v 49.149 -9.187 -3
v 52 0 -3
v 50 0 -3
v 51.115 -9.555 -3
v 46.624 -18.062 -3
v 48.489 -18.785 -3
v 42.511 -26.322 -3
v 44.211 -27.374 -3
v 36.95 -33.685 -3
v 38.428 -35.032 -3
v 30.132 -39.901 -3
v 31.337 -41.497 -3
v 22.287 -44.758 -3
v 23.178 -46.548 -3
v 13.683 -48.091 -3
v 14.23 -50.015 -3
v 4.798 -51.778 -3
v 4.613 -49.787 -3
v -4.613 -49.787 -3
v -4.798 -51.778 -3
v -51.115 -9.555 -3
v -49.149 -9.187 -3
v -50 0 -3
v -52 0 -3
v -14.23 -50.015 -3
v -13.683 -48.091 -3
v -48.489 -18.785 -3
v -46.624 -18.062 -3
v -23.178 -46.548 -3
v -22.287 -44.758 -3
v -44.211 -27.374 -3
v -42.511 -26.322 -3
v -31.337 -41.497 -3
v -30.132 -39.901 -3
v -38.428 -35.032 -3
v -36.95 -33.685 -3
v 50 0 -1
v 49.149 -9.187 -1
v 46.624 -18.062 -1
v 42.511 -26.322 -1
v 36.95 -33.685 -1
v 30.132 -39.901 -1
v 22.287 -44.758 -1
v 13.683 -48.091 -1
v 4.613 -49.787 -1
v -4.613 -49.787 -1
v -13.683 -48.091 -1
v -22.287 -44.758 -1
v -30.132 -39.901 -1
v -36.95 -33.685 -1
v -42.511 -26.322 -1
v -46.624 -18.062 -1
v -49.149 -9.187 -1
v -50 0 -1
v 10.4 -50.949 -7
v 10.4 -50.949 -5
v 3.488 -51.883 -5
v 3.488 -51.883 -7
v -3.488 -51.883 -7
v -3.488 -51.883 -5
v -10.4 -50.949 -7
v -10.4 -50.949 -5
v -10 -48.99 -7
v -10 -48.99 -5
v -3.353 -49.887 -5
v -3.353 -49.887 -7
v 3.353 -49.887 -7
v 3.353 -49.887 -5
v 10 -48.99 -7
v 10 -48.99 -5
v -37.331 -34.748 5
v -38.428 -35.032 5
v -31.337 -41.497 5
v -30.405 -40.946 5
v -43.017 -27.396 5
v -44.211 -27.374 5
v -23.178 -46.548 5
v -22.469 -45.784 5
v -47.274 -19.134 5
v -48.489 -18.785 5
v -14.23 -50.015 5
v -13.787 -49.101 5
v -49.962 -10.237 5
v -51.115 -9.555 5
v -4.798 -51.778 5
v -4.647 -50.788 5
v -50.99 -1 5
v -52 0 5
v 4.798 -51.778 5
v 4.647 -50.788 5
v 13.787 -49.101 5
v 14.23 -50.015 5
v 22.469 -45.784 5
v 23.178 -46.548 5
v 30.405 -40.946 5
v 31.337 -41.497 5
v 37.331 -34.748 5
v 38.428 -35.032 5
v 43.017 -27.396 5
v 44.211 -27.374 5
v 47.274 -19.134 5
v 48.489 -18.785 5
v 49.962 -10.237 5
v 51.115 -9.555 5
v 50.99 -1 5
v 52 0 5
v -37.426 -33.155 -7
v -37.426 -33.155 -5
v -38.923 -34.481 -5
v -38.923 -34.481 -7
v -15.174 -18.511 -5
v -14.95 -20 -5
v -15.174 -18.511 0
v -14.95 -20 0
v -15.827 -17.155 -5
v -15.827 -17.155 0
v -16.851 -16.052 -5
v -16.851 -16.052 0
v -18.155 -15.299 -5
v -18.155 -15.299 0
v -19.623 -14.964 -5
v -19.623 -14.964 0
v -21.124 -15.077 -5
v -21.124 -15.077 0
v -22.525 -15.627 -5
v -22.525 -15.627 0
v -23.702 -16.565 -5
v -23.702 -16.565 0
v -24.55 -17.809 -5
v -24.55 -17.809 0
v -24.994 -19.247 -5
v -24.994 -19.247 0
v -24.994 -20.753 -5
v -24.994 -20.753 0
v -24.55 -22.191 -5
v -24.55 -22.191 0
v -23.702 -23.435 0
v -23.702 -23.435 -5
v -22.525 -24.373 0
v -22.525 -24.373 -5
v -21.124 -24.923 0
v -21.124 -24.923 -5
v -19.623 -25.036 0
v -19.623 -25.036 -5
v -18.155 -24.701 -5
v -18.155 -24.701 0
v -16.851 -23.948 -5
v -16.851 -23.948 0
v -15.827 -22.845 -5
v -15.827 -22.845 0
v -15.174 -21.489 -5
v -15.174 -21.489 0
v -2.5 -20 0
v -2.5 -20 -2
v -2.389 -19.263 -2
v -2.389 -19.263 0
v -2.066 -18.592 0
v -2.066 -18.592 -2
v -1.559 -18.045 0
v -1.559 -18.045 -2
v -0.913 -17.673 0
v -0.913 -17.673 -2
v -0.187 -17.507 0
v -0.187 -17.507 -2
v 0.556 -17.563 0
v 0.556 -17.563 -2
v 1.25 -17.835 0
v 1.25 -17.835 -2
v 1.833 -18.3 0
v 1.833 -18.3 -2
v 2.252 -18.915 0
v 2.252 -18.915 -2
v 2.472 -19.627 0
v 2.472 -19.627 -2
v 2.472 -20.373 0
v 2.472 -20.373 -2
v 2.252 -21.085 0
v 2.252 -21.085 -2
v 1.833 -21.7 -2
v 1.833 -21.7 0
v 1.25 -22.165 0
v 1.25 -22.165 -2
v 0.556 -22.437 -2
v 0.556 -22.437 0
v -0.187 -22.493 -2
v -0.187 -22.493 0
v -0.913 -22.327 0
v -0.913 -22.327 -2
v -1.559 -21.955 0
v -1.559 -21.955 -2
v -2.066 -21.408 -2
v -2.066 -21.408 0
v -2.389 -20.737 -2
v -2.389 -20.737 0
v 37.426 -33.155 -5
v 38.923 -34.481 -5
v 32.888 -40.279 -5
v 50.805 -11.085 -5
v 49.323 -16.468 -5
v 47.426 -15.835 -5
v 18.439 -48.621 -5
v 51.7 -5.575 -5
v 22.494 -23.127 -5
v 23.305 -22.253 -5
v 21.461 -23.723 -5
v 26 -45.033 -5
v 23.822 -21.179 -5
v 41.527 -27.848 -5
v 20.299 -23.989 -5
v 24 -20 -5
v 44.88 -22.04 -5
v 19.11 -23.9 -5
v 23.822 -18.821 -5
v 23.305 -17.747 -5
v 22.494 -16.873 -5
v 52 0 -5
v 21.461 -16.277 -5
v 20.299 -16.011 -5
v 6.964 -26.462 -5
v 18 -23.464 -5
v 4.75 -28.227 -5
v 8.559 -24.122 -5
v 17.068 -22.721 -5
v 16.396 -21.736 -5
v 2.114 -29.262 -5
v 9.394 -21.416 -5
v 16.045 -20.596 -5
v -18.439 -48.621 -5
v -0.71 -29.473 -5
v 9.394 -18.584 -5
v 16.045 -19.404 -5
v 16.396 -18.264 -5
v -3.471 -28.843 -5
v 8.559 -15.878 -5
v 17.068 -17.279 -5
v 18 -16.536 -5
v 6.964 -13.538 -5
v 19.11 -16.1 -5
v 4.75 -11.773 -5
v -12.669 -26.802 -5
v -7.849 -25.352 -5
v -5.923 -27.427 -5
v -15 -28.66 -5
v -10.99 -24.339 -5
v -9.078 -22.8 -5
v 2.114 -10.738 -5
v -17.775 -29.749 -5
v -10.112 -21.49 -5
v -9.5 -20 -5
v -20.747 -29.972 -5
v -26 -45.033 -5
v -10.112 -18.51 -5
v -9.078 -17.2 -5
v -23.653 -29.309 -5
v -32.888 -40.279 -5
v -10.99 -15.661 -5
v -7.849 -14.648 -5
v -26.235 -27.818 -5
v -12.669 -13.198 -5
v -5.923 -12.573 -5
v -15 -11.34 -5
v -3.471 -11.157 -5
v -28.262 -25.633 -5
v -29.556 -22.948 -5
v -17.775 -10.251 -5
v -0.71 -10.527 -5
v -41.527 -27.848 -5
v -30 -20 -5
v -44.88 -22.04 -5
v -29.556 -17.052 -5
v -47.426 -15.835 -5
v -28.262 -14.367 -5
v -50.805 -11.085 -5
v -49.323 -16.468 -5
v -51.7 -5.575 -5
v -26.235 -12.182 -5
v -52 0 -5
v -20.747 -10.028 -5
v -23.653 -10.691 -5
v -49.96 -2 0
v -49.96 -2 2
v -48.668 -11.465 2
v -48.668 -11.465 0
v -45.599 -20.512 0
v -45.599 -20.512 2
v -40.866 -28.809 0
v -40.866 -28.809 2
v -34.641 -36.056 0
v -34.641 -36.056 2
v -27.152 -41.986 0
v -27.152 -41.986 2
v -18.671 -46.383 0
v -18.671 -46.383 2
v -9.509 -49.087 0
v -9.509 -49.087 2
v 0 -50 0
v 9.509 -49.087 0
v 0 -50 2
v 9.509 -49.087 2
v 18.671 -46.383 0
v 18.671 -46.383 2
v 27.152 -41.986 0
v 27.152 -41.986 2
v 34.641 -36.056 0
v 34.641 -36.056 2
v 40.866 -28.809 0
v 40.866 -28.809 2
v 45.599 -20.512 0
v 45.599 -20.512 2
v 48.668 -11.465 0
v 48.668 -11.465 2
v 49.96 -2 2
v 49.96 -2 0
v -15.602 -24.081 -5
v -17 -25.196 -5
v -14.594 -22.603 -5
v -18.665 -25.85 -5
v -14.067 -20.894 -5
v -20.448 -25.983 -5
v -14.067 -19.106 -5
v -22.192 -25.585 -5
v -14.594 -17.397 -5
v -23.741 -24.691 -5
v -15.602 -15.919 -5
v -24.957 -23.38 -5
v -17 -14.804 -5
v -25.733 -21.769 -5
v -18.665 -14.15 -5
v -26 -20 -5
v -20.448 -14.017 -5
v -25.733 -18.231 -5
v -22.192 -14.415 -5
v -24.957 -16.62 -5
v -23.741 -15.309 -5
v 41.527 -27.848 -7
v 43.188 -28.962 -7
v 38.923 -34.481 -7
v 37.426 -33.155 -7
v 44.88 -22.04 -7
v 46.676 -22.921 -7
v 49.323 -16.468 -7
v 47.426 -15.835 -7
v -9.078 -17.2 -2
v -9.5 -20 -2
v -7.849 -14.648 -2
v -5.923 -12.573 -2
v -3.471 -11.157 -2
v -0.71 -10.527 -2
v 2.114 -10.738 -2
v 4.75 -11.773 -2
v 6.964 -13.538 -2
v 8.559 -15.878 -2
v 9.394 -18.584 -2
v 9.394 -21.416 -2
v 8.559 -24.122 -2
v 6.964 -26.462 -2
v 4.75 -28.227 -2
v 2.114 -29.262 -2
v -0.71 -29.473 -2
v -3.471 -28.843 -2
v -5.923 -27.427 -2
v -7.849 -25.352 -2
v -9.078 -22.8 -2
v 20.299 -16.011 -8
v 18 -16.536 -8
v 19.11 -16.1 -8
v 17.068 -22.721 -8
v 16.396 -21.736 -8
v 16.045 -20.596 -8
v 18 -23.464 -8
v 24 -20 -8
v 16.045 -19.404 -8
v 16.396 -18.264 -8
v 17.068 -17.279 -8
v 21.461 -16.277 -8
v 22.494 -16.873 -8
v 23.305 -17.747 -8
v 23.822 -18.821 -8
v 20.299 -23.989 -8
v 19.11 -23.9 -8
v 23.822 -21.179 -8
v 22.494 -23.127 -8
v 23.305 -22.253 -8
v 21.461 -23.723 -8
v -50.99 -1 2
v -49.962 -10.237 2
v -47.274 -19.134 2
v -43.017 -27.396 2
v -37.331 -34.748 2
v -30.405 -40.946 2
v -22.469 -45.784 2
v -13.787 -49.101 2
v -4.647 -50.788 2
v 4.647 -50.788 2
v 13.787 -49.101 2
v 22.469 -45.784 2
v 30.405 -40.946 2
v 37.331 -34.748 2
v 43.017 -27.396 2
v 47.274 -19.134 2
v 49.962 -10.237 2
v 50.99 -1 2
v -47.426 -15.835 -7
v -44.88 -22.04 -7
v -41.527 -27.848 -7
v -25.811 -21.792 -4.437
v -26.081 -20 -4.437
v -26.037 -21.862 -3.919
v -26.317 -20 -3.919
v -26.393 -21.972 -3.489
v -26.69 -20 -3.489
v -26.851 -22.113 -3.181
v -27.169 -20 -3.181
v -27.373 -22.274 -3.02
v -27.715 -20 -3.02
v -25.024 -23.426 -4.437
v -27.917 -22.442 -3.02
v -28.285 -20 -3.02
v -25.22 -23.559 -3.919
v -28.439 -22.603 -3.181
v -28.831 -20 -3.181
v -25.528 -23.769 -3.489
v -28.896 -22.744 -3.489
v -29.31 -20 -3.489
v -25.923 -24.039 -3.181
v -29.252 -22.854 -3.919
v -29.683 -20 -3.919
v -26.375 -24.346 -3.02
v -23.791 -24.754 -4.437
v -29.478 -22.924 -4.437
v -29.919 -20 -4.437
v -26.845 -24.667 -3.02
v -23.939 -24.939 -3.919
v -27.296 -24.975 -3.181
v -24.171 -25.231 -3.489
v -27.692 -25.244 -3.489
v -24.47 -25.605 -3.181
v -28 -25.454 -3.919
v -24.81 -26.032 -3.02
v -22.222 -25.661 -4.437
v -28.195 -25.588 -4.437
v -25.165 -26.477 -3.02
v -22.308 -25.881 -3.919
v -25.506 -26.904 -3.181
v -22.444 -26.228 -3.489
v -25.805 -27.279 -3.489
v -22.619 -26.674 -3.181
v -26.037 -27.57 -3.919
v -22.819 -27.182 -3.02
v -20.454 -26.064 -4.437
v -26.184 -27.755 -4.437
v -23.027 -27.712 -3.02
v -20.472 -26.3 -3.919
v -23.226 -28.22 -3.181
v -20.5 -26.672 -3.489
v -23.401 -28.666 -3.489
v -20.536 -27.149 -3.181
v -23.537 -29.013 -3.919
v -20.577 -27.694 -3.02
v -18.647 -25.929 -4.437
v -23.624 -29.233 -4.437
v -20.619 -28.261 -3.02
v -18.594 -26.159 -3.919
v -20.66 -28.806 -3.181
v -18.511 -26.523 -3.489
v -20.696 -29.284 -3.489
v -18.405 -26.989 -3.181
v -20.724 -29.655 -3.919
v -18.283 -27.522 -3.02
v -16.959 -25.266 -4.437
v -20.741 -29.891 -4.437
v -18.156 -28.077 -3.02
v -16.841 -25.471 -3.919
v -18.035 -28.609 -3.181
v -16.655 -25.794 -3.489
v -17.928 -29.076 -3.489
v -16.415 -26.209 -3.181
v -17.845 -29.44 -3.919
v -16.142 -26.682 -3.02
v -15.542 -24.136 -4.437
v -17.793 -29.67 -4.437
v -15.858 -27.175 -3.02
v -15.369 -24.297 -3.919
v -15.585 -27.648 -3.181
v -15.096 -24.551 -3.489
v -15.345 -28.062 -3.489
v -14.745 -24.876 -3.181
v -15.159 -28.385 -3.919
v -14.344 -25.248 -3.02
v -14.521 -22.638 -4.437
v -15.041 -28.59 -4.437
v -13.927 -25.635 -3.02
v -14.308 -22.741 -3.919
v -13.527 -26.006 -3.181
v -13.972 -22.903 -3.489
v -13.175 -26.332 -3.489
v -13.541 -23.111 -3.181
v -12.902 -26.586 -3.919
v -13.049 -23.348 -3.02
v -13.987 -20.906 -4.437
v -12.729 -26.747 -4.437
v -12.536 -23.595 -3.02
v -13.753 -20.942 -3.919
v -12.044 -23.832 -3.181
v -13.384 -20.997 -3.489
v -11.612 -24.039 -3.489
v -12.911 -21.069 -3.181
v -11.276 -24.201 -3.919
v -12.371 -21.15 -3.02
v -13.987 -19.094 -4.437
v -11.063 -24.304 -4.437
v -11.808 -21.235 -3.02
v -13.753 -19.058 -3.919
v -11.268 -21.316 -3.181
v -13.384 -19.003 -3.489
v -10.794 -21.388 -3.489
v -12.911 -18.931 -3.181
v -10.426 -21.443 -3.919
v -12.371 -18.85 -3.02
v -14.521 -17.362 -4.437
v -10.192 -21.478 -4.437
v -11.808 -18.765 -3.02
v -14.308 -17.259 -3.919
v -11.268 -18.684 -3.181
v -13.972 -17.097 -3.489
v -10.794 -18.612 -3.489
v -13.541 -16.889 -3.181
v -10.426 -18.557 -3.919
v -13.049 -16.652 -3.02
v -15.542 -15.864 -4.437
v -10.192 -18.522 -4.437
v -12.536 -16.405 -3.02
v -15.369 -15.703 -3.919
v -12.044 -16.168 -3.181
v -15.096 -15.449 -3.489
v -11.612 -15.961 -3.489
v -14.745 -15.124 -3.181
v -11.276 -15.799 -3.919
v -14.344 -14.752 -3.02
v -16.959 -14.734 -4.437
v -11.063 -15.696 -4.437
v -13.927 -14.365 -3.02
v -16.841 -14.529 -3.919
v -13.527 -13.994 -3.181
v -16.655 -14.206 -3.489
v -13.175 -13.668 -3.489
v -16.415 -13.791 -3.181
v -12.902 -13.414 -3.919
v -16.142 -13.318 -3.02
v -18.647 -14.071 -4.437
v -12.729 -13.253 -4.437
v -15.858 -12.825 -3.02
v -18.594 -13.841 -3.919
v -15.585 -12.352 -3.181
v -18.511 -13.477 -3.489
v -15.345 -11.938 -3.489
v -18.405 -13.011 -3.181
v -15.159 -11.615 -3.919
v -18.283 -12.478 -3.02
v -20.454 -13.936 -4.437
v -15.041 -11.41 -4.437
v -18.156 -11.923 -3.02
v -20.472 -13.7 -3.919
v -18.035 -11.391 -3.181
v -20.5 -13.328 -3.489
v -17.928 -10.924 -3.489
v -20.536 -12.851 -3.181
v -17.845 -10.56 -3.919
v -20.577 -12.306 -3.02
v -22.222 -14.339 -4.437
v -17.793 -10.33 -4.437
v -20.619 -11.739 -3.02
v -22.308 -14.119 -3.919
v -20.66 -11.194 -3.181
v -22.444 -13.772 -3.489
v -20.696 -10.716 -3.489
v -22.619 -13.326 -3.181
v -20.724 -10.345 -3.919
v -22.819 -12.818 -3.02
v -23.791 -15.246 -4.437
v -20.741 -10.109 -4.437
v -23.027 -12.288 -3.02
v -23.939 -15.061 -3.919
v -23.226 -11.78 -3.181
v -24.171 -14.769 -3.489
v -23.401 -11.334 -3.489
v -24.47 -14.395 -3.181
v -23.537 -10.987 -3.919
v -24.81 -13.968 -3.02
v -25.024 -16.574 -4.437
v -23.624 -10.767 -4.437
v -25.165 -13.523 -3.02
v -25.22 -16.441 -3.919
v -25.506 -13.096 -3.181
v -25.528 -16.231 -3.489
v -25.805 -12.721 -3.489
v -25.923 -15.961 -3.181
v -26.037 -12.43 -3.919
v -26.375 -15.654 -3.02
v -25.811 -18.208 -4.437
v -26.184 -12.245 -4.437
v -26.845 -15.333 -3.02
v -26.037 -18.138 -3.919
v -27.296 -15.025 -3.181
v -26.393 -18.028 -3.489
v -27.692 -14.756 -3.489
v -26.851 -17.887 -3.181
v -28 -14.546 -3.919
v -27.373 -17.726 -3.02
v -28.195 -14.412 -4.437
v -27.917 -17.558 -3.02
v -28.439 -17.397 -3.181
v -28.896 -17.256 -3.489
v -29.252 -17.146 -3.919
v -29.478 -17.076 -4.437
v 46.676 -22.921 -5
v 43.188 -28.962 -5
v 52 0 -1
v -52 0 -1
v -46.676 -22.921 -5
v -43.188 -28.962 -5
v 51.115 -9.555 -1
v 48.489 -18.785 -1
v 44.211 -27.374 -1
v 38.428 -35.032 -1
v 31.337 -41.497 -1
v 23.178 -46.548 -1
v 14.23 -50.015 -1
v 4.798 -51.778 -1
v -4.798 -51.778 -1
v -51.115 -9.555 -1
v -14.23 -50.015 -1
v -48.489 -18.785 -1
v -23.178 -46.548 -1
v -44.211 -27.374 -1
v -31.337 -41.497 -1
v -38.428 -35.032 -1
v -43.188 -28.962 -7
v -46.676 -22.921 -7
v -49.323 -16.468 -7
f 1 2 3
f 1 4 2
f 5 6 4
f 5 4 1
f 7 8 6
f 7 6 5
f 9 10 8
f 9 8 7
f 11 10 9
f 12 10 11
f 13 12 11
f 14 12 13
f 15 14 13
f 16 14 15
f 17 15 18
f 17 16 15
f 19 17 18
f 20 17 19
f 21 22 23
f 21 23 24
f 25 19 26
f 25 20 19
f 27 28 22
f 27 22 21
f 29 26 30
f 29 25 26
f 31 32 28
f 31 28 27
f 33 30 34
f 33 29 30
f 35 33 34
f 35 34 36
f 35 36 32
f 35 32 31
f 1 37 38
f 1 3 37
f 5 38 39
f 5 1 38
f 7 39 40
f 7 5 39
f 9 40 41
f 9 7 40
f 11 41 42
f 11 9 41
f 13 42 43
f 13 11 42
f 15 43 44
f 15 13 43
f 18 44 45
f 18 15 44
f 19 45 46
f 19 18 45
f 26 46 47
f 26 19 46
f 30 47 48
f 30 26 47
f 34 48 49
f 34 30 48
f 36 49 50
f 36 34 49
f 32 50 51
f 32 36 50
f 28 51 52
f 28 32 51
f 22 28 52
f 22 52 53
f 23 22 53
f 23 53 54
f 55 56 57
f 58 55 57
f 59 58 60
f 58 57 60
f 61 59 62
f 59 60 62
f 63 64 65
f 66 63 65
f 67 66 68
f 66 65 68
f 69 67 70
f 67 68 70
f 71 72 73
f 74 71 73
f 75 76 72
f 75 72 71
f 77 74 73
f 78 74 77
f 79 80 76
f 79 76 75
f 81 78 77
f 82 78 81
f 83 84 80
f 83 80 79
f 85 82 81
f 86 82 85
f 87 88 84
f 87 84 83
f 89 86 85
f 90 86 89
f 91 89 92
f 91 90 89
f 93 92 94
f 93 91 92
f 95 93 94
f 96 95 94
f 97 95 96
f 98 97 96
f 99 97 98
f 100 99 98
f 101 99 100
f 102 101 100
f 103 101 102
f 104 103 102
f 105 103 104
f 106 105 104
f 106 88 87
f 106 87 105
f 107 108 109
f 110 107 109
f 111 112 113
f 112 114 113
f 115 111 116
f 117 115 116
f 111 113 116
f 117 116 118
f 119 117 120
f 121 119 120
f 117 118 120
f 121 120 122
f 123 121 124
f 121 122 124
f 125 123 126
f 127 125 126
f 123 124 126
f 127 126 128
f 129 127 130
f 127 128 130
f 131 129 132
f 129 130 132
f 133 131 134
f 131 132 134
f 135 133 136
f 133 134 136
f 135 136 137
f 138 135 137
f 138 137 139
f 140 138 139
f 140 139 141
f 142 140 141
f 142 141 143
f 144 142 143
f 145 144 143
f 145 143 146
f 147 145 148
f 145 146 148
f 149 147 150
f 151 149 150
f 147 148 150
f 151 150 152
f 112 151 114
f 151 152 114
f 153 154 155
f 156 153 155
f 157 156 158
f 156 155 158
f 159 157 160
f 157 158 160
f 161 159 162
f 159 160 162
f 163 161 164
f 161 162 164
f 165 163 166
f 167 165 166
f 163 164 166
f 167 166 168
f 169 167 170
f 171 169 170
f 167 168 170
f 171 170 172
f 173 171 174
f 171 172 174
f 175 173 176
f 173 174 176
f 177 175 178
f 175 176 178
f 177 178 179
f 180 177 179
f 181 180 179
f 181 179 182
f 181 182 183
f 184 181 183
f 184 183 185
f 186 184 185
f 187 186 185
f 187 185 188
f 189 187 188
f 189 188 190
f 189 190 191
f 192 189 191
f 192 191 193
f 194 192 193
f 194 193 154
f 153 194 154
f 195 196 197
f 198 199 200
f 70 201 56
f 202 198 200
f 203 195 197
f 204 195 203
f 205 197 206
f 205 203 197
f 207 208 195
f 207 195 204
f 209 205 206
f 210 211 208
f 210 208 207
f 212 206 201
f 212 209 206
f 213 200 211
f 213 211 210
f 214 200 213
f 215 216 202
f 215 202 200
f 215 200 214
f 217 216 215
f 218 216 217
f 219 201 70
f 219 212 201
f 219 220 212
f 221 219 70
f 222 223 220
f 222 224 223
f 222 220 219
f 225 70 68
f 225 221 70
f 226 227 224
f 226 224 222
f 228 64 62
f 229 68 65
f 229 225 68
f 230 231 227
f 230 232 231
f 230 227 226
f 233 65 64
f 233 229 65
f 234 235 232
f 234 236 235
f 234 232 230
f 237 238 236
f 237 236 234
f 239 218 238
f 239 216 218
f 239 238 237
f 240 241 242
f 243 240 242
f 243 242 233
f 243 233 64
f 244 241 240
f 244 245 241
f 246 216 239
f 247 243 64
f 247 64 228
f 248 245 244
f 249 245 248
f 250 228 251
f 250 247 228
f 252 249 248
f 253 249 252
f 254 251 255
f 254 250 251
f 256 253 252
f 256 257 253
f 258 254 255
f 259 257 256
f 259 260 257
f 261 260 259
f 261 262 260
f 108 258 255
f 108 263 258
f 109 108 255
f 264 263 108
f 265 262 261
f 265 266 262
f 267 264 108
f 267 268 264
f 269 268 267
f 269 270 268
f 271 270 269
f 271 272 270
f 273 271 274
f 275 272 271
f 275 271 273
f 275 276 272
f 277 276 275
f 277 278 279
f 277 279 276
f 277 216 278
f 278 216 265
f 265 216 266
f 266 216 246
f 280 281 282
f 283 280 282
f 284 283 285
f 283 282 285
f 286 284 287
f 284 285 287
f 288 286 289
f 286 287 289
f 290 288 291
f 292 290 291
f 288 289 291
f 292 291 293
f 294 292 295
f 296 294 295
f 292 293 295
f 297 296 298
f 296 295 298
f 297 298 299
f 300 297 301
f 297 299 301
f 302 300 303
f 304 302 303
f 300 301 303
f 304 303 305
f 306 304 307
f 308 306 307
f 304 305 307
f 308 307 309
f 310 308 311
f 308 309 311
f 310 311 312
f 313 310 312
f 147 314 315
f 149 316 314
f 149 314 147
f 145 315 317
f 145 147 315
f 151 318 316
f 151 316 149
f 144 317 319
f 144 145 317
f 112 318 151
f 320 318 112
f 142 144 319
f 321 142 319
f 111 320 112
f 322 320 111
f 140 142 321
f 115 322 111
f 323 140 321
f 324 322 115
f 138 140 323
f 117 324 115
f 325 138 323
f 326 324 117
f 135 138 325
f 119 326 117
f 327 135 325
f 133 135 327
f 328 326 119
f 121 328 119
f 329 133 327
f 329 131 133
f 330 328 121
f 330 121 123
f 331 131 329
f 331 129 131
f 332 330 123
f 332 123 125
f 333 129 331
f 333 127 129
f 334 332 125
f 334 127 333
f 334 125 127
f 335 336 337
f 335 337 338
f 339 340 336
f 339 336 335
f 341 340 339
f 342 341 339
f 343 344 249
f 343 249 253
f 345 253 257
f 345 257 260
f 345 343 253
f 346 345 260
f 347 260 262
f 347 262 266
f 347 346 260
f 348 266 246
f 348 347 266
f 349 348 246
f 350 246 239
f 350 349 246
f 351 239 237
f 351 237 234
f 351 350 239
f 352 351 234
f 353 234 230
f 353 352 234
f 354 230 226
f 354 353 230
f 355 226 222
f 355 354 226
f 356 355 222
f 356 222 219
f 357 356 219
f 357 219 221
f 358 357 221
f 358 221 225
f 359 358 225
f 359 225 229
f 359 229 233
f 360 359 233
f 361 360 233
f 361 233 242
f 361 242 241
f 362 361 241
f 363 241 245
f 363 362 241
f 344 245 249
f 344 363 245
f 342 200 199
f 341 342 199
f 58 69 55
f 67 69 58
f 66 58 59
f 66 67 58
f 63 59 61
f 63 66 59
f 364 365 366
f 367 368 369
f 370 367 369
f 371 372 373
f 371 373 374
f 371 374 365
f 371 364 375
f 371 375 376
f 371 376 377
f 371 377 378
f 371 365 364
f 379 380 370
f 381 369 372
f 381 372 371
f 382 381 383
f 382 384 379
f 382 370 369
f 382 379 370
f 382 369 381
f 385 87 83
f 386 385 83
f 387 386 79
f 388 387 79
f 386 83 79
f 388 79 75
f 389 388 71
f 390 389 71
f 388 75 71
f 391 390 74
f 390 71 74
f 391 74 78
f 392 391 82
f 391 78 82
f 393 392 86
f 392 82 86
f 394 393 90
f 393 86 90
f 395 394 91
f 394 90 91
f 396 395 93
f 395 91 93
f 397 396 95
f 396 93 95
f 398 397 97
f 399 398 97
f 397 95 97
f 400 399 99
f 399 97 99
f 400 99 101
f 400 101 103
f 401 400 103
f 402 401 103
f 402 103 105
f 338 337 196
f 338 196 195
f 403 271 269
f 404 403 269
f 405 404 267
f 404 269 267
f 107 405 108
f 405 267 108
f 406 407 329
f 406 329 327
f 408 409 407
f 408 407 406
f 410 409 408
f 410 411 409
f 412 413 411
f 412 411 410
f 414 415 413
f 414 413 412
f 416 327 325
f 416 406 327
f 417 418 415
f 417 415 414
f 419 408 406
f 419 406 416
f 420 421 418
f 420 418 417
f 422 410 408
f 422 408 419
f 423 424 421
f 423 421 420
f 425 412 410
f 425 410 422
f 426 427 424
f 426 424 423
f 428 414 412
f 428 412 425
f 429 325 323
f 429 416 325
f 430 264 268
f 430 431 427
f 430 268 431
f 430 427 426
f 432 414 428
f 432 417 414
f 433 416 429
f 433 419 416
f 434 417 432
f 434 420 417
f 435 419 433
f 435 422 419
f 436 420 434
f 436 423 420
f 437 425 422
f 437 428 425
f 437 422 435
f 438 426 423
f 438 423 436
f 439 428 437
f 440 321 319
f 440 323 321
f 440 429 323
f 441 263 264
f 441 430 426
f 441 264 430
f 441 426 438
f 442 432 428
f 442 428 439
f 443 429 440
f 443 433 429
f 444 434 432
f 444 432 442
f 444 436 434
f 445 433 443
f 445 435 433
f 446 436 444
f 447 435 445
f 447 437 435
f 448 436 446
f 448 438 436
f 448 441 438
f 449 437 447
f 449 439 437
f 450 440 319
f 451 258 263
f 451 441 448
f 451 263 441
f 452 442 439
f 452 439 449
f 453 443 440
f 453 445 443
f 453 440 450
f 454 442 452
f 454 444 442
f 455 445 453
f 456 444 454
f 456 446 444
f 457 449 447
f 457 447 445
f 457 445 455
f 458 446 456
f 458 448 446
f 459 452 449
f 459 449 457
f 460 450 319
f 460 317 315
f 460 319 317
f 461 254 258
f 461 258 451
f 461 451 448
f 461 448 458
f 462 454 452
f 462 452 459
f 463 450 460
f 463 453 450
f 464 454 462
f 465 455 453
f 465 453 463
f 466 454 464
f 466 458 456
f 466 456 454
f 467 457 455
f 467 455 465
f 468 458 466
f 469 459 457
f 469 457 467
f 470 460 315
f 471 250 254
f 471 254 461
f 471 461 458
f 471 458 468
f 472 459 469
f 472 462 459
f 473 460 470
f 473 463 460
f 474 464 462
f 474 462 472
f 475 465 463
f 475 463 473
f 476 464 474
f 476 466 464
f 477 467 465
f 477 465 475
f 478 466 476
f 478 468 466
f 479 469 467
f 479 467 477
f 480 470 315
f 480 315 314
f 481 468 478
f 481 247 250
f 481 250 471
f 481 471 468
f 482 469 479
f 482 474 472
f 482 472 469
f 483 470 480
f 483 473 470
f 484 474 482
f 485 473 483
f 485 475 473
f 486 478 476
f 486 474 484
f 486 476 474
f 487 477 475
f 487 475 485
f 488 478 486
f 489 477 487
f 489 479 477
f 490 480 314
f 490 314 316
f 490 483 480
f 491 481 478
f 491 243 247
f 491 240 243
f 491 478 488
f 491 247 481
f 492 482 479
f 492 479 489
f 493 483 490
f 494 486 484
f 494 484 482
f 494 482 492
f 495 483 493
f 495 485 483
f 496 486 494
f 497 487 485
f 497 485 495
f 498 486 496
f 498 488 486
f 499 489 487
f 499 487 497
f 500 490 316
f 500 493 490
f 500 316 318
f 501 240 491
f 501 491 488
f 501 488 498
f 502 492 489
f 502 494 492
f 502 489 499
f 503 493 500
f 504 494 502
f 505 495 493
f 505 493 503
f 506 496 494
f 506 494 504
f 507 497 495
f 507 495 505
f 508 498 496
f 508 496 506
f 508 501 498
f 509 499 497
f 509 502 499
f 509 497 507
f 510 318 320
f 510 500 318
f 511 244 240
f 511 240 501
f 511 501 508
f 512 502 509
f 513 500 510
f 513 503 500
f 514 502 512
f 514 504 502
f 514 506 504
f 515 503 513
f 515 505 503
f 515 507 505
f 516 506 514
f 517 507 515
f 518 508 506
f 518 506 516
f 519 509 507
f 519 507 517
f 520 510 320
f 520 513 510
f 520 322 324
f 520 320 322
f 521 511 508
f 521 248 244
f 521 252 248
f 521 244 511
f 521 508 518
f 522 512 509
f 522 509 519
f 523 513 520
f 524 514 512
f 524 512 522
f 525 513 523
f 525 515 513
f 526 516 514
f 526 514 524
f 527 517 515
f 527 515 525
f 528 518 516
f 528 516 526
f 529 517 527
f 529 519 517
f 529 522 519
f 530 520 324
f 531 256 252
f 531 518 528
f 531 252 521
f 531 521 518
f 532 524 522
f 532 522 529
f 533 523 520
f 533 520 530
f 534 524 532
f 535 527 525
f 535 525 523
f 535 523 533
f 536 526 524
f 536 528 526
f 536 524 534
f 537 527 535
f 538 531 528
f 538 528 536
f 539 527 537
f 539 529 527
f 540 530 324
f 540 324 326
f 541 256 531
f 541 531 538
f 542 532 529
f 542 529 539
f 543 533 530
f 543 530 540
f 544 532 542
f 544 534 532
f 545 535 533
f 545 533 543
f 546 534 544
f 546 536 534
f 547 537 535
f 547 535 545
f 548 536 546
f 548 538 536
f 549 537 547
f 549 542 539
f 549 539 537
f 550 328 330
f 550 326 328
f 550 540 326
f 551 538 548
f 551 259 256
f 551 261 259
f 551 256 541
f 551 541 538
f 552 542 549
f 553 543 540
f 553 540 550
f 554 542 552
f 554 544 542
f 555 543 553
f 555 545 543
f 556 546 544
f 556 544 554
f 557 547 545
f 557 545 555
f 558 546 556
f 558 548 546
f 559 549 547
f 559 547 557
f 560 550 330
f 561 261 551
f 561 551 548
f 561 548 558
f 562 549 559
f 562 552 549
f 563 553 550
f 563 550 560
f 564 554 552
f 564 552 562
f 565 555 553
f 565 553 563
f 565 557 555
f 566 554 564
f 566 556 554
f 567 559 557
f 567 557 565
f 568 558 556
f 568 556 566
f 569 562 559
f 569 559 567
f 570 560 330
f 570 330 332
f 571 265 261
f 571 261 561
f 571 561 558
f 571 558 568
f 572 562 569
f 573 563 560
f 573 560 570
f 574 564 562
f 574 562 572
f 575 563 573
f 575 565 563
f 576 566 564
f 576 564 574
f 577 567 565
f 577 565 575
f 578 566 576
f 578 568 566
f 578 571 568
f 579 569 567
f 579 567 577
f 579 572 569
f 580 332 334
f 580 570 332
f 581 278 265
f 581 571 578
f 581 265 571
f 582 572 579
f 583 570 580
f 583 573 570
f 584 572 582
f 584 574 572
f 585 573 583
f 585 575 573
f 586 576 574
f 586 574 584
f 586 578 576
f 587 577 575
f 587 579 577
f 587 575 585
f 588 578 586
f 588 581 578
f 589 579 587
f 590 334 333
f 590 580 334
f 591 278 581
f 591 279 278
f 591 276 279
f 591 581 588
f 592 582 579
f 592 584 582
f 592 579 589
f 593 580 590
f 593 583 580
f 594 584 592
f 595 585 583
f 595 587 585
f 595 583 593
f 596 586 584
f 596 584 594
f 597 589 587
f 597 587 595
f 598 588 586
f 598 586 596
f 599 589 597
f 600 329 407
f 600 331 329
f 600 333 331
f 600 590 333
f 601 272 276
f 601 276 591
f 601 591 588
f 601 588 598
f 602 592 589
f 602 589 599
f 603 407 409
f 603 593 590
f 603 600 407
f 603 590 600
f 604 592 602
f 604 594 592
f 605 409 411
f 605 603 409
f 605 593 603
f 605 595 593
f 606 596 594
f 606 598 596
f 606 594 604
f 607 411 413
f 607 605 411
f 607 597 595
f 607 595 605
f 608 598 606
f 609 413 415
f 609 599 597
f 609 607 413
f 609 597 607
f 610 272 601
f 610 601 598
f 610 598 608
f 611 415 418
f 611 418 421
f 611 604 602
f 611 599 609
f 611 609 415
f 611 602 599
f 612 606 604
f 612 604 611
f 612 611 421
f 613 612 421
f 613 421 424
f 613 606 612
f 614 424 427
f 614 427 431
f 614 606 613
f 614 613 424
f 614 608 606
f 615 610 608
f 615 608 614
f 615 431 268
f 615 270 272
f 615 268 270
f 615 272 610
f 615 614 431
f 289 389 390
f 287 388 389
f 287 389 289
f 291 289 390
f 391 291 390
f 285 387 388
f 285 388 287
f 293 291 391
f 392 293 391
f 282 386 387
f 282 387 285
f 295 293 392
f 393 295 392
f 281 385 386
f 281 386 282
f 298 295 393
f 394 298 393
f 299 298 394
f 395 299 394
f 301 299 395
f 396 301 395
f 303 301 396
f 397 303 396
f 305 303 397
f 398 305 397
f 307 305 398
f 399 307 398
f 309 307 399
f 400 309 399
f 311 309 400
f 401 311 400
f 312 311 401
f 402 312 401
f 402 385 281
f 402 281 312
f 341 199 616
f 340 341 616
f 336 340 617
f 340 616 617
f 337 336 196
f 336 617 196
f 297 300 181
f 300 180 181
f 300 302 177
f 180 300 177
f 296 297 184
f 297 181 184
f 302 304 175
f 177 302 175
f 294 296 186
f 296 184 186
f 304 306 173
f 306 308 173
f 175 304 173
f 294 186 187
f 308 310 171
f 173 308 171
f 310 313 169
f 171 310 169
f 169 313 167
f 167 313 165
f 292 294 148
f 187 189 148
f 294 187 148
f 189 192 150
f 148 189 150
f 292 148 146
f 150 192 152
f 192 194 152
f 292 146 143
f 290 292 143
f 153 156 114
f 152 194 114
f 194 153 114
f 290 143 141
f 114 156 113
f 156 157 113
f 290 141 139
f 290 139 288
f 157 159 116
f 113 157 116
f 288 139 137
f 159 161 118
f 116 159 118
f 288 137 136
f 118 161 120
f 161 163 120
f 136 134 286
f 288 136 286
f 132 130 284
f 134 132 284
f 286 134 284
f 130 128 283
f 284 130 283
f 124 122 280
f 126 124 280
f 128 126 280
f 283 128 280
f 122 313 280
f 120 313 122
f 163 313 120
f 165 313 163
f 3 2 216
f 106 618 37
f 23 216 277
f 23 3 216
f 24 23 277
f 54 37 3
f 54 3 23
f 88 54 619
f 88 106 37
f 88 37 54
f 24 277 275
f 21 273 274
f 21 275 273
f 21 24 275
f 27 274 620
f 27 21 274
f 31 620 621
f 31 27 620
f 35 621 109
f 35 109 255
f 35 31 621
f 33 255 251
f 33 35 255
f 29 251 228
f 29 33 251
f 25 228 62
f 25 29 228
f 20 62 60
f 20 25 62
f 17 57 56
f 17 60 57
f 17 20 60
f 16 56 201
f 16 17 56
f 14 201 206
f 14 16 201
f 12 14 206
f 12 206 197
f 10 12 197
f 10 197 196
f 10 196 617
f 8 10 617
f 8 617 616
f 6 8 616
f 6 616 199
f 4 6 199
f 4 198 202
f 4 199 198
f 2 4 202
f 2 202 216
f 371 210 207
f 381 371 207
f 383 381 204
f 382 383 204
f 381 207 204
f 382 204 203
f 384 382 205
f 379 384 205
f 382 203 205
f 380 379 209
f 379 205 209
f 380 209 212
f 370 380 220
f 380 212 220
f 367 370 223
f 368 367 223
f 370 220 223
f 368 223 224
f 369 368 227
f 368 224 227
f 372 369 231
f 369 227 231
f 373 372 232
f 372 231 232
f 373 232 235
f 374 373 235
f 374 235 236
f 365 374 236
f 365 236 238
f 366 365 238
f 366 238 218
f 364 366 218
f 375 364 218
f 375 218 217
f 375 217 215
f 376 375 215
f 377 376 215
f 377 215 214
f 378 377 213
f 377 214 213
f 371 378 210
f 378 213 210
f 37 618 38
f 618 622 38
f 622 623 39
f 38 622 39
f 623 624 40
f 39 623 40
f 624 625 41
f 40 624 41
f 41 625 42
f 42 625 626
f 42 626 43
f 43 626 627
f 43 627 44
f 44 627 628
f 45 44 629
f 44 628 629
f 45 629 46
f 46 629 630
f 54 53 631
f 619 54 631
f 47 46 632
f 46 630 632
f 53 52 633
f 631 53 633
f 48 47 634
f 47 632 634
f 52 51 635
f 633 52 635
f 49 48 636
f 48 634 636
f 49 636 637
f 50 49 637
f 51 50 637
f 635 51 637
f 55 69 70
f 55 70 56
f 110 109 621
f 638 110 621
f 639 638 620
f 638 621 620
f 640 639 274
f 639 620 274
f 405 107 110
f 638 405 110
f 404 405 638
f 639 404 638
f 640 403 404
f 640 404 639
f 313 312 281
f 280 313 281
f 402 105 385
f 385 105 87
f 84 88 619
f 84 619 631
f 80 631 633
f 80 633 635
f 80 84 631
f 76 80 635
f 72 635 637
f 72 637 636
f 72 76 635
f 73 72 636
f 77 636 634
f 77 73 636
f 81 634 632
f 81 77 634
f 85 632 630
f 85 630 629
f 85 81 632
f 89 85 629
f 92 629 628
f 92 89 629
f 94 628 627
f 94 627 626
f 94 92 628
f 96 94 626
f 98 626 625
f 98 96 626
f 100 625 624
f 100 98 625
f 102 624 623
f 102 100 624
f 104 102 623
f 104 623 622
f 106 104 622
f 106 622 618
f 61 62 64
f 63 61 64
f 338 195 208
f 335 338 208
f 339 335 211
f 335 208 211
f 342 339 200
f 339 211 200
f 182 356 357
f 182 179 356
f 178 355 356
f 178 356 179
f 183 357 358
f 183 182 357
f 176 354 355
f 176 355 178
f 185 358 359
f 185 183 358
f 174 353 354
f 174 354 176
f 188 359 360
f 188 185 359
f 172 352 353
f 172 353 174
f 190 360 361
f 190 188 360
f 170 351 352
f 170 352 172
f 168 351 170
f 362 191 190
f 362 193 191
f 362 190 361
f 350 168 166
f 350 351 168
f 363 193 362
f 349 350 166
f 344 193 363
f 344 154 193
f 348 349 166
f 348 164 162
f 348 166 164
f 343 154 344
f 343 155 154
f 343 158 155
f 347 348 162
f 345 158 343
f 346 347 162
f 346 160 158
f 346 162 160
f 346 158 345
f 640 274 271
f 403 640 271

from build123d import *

# Parameters (mm, degrees)
SKETCH1_R           = 5.05
BOSS_EXTRUDE1_DEPTH = 5
BOSS_EXTRUDE2_START = 5
BOSS_EXTRUDE2_DEPTH = 5
BOSS_EXTRUDE4_DEPTH = 2
CUT_EXTRUDE1_START  = -3
SKETCH6_R           = 9.5
SKETCH6_R_2         = 5.05
CUT_EXTRUDE1_DEPTH  = 3
SKETCH7_R           = 2.5
CUT_EXTRUDE2_DEPTH  = 74.87151007
SKETCH8_R           = 4
BOSS_EXTRUDE5_DEPTH = 3
CUT_EXTRUDE3_DEPTH  = 3
SKETCH10_W          = 8.596273884
SKETCH10_H          = 2
CUT_REVOLVE1_ANGLE  = 180
SKETCH12_R          = 2


with BuildPart() as part:
    # Sketch1 → Boss-Extrude1 (new body)
    with BuildSketch(Plane.XY):
        with BuildLine():
            Line((-52, 0), (52, 0))
            ThreePointArc((52, 0), (0, -52), (-52, 0))
        make_face()
        with Locations((-20, -20)):
            Circle(SKETCH1_R, mode=Mode.SUBTRACT)
    extrude(amount=-BOSS_EXTRUDE1_DEPTH)

    # Sketch2 → Boss-Extrude2 (add)
    with BuildSketch(Plane.XY.offset(BOSS_EXTRUDE2_START)):
        with BuildLine():
            Line((52, 0), (-52, 0))
            ThreePointArc((-52, 0), (0, -52), (52, 0))
        make_face()
        with BuildLine():
            Line((49.959983987, -2), (-49.959983987, -2))
            ThreePointArc((-49.959983987, -2), (0, -50), (49.959983987, -2))
        make_face(mode=Mode.SUBTRACT)
    extrude(amount=-BOSS_EXTRUDE2_DEPTH)

    # Sketch5 → Boss-Extrude4 (add)
    with BuildSketch(Plane(origin=(0, 0, -5), x_dir=(-1, 0, 0), z_dir=(0, 0, -1))):
        with BuildLine():
            ThreePointArc((-49.323463146, -16.468029126), (-45.033320997, -26), (-38.923463146, -34.481357524))
            Line((-38.923463146, -34.481357524), (-37.426406871, -33.155151466))
            ThreePointArc((-37.426406871, -33.155151466), (-43.301270189, -25), (-47.426406871, -15.83464339))
            Line((-47.426406871, -15.83464339), (-49.323463146, -16.468029126))
        make_face()
        with BuildLine():
            Line((10.4, -50.94938665), (10, -48.989794856))
            ThreePointArc((10, -48.989794856), (0, -50), (-10, -48.989794856))
            Line((-10, -48.989794856), (-10.4, -50.94938665))
            ThreePointArc((-10.4, -50.94938665), (0, -52), (10.4, -50.94938665))
        make_face()
        with BuildLine():
            Line((37.426406871, -33.155151466), (38.923463146, -34.481357524))
            ThreePointArc((38.923463146, -34.481357524), (45.033320997, -26), (49.323463146, -16.468029126))
            Line((49.323463146, -16.468029126), (47.426406871, -15.83464339))
            ThreePointArc((47.426406871, -15.83464339), (43.301270189, -25), (37.426406871, -33.155151466))
        make_face()
    extrude(amount=BOSS_EXTRUDE4_DEPTH)

    # Sketch6 → Cut-Extrude1 (cut)
    with BuildSketch(Plane(origin=(0, 0, -5), x_dir=(-1, 0, 0), z_dir=(0, 0, -1)).offset(CUT_EXTRUDE1_START)):
        with Locations((0, -20)):
            Circle(SKETCH6_R)
        with Locations(Location((20, -20, 0), (0, 0, 180))):
            Circle(SKETCH6_R_2)
    extrude(amount=CUT_EXTRUDE1_DEPTH, mode=Mode.SUBTRACT)

    # Sketch7 → Cut-Extrude2 (cut, through all)
    with BuildSketch(Plane(origin=(0, 0, -2), x_dir=(-1, 0, 0), z_dir=(0, 0, -1))):
        with Locations((0, -20)):
            Circle(SKETCH7_R)
    extrude(amount=-CUT_EXTRUDE2_DEPTH, mode=Mode.SUBTRACT)

    # Sketch8 → Boss-Extrude5 (add)
    with BuildSketch(Plane(origin=(0, 0, -5), x_dir=(-1, 0, 0), z_dir=(0, 0, -1))):
        with Locations(Location((-20, -20, 0), (0, 0, 180))):
            Circle(SKETCH8_R)
    extrude(amount=BOSS_EXTRUDE5_DEPTH)

    # Sketch9 → Cut-Extrude3 (cut)
    # profile 1 of 2: a face of its own
    with BuildSketch(Plane.XY.offset(5)):
        with BuildLine():
            Line((50.990195136, -1), (-50.990195136, -1))
            ThreePointArc((-50.990195136, -1), (0, -51), (50.990195136, -1))
        make_face()
        with BuildLine():
            ThreePointArc((49.959983987, -2), (0, -50), (-49.959983987, -2))
            Line((-49.959983987, -2), (49.959983987, -2))
        make_face(mode=Mode.SUBTRACT)
    # profile 2 of 2: a face of its own
    with BuildSketch(Plane.XY.offset(5)):
        with BuildLine():
            Line((-49.959983987, -2), (49.959983987, -2))
            ThreePointArc((49.959983987, -2), (0, -50), (-49.959983987, -2))
        make_face()
    extrude(amount=-CUT_EXTRUDE3_DEPTH, mode=Mode.SUBTRACT)

    # Sketch10 → Cut-Revolve1 (revolve, cut)
    with BuildSketch(Plane(origin=(0, 0, 0), x_dir=(1, 0, 0), z_dir=(0, 1, 0))):
        with Locations((54.298136942, 2)):
            Rectangle(SKETCH10_W, SKETCH10_H)
    revolve(axis=Axis((0, 0, -7.000025), (0, 0, -1)), revolution_arc=CUT_REVOLVE1_ANGLE, mode=Mode.SUBTRACT)

    # Sketch12 → Cut-Revolve2 (revolve, cut)
    with BuildSketch(Plane(origin=(0, -20, 0), x_dir=(1, 0, 0), z_dir=(0, 1, 0)), mode=Mode.PRIVATE) as cut_revolve2_sk:
        with Locations((-12, 5)):
            Circle(SKETCH12_R)
    revolve(cut_revolve2_sk.sketch.rotate(Axis((-20, -20, -5), (0, 0, 1)), 180), axis=Axis((-20, -20, -5), (0, 0, 1)), mode=Mode.SUBTRACT)


solid = part.part
